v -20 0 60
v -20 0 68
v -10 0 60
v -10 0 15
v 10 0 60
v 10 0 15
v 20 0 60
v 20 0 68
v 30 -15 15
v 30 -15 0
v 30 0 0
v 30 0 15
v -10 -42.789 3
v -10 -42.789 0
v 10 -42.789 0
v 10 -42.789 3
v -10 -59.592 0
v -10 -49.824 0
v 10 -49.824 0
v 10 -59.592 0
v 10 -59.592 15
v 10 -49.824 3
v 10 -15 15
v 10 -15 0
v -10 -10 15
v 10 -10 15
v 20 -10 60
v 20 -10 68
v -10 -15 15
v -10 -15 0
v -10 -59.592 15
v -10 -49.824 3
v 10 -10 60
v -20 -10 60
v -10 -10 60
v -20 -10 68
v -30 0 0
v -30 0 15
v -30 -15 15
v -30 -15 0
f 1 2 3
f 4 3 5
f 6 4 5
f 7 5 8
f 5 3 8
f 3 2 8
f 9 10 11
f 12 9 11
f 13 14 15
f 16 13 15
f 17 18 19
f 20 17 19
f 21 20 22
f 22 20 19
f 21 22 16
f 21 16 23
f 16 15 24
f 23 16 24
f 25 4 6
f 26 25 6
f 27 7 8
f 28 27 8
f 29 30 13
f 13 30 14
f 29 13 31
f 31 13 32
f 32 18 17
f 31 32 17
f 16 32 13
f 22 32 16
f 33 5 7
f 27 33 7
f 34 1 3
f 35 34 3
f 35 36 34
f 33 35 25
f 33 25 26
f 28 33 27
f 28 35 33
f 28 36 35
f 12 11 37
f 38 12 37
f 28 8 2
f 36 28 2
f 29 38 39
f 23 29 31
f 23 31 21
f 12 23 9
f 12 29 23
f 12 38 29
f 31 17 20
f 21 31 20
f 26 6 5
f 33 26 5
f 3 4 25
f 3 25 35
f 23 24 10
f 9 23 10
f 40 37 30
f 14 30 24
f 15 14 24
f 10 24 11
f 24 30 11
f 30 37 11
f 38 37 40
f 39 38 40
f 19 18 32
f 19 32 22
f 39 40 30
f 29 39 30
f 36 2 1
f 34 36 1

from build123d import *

# Parameters (mm, degrees)
F1_DEPTH = 15
F2_W     = 20
F2_H     = 7.034738
F3_DEPTH = 3
F4_W     = 10
F4_H     = 45
F5_DEPTH = 10


with BuildPart() as f1:
    # F0 (on Top) → F1 (new body)
    with BuildSketch(Plane.XY):
        Polygon((30, 0), (0, 0), (-30, 0), (-30, -15), (-10, -15), (-10, -59.591832), (0, -59.591832), (10, -59.591832), (10, -15), (30, -15), align=None)
    extrude(amount=F1_DEPTH)

    # F2 (on face) → F3 (cut)
    with BuildSketch(Plane(origin=(0, 0, 0), x_dir=(1, 0, 0), z_dir=(0, 0, -1))):
        with Locations((0, 46.306135)):
            Rectangle(F2_W, F2_H)
    extrude(amount=-F3_DEPTH, mode=Mode.SUBTRACT)


with BuildPart() as f5:
    # F4 (on Front) → F5 (new body)
    with BuildSketch(Plane.XZ):
        Polygon((0, 60), (0, 15), (10, 15), (10, 15.626872), (10, 60), align=None)
        with Locations((-5, 37.5)):
            Rectangle(F4_W, F4_H)
        Polygon((-10, 60), (0, 60), (0, 68), (-20, 68), (-20, 60), align=None)
        Polygon((0, 68), (0, 60), (10, 60), (20, 60), (20, 68), align=None)
    extrude(amount=F5_DEPTH)


solid = Compound([f1.part, f5.part])
